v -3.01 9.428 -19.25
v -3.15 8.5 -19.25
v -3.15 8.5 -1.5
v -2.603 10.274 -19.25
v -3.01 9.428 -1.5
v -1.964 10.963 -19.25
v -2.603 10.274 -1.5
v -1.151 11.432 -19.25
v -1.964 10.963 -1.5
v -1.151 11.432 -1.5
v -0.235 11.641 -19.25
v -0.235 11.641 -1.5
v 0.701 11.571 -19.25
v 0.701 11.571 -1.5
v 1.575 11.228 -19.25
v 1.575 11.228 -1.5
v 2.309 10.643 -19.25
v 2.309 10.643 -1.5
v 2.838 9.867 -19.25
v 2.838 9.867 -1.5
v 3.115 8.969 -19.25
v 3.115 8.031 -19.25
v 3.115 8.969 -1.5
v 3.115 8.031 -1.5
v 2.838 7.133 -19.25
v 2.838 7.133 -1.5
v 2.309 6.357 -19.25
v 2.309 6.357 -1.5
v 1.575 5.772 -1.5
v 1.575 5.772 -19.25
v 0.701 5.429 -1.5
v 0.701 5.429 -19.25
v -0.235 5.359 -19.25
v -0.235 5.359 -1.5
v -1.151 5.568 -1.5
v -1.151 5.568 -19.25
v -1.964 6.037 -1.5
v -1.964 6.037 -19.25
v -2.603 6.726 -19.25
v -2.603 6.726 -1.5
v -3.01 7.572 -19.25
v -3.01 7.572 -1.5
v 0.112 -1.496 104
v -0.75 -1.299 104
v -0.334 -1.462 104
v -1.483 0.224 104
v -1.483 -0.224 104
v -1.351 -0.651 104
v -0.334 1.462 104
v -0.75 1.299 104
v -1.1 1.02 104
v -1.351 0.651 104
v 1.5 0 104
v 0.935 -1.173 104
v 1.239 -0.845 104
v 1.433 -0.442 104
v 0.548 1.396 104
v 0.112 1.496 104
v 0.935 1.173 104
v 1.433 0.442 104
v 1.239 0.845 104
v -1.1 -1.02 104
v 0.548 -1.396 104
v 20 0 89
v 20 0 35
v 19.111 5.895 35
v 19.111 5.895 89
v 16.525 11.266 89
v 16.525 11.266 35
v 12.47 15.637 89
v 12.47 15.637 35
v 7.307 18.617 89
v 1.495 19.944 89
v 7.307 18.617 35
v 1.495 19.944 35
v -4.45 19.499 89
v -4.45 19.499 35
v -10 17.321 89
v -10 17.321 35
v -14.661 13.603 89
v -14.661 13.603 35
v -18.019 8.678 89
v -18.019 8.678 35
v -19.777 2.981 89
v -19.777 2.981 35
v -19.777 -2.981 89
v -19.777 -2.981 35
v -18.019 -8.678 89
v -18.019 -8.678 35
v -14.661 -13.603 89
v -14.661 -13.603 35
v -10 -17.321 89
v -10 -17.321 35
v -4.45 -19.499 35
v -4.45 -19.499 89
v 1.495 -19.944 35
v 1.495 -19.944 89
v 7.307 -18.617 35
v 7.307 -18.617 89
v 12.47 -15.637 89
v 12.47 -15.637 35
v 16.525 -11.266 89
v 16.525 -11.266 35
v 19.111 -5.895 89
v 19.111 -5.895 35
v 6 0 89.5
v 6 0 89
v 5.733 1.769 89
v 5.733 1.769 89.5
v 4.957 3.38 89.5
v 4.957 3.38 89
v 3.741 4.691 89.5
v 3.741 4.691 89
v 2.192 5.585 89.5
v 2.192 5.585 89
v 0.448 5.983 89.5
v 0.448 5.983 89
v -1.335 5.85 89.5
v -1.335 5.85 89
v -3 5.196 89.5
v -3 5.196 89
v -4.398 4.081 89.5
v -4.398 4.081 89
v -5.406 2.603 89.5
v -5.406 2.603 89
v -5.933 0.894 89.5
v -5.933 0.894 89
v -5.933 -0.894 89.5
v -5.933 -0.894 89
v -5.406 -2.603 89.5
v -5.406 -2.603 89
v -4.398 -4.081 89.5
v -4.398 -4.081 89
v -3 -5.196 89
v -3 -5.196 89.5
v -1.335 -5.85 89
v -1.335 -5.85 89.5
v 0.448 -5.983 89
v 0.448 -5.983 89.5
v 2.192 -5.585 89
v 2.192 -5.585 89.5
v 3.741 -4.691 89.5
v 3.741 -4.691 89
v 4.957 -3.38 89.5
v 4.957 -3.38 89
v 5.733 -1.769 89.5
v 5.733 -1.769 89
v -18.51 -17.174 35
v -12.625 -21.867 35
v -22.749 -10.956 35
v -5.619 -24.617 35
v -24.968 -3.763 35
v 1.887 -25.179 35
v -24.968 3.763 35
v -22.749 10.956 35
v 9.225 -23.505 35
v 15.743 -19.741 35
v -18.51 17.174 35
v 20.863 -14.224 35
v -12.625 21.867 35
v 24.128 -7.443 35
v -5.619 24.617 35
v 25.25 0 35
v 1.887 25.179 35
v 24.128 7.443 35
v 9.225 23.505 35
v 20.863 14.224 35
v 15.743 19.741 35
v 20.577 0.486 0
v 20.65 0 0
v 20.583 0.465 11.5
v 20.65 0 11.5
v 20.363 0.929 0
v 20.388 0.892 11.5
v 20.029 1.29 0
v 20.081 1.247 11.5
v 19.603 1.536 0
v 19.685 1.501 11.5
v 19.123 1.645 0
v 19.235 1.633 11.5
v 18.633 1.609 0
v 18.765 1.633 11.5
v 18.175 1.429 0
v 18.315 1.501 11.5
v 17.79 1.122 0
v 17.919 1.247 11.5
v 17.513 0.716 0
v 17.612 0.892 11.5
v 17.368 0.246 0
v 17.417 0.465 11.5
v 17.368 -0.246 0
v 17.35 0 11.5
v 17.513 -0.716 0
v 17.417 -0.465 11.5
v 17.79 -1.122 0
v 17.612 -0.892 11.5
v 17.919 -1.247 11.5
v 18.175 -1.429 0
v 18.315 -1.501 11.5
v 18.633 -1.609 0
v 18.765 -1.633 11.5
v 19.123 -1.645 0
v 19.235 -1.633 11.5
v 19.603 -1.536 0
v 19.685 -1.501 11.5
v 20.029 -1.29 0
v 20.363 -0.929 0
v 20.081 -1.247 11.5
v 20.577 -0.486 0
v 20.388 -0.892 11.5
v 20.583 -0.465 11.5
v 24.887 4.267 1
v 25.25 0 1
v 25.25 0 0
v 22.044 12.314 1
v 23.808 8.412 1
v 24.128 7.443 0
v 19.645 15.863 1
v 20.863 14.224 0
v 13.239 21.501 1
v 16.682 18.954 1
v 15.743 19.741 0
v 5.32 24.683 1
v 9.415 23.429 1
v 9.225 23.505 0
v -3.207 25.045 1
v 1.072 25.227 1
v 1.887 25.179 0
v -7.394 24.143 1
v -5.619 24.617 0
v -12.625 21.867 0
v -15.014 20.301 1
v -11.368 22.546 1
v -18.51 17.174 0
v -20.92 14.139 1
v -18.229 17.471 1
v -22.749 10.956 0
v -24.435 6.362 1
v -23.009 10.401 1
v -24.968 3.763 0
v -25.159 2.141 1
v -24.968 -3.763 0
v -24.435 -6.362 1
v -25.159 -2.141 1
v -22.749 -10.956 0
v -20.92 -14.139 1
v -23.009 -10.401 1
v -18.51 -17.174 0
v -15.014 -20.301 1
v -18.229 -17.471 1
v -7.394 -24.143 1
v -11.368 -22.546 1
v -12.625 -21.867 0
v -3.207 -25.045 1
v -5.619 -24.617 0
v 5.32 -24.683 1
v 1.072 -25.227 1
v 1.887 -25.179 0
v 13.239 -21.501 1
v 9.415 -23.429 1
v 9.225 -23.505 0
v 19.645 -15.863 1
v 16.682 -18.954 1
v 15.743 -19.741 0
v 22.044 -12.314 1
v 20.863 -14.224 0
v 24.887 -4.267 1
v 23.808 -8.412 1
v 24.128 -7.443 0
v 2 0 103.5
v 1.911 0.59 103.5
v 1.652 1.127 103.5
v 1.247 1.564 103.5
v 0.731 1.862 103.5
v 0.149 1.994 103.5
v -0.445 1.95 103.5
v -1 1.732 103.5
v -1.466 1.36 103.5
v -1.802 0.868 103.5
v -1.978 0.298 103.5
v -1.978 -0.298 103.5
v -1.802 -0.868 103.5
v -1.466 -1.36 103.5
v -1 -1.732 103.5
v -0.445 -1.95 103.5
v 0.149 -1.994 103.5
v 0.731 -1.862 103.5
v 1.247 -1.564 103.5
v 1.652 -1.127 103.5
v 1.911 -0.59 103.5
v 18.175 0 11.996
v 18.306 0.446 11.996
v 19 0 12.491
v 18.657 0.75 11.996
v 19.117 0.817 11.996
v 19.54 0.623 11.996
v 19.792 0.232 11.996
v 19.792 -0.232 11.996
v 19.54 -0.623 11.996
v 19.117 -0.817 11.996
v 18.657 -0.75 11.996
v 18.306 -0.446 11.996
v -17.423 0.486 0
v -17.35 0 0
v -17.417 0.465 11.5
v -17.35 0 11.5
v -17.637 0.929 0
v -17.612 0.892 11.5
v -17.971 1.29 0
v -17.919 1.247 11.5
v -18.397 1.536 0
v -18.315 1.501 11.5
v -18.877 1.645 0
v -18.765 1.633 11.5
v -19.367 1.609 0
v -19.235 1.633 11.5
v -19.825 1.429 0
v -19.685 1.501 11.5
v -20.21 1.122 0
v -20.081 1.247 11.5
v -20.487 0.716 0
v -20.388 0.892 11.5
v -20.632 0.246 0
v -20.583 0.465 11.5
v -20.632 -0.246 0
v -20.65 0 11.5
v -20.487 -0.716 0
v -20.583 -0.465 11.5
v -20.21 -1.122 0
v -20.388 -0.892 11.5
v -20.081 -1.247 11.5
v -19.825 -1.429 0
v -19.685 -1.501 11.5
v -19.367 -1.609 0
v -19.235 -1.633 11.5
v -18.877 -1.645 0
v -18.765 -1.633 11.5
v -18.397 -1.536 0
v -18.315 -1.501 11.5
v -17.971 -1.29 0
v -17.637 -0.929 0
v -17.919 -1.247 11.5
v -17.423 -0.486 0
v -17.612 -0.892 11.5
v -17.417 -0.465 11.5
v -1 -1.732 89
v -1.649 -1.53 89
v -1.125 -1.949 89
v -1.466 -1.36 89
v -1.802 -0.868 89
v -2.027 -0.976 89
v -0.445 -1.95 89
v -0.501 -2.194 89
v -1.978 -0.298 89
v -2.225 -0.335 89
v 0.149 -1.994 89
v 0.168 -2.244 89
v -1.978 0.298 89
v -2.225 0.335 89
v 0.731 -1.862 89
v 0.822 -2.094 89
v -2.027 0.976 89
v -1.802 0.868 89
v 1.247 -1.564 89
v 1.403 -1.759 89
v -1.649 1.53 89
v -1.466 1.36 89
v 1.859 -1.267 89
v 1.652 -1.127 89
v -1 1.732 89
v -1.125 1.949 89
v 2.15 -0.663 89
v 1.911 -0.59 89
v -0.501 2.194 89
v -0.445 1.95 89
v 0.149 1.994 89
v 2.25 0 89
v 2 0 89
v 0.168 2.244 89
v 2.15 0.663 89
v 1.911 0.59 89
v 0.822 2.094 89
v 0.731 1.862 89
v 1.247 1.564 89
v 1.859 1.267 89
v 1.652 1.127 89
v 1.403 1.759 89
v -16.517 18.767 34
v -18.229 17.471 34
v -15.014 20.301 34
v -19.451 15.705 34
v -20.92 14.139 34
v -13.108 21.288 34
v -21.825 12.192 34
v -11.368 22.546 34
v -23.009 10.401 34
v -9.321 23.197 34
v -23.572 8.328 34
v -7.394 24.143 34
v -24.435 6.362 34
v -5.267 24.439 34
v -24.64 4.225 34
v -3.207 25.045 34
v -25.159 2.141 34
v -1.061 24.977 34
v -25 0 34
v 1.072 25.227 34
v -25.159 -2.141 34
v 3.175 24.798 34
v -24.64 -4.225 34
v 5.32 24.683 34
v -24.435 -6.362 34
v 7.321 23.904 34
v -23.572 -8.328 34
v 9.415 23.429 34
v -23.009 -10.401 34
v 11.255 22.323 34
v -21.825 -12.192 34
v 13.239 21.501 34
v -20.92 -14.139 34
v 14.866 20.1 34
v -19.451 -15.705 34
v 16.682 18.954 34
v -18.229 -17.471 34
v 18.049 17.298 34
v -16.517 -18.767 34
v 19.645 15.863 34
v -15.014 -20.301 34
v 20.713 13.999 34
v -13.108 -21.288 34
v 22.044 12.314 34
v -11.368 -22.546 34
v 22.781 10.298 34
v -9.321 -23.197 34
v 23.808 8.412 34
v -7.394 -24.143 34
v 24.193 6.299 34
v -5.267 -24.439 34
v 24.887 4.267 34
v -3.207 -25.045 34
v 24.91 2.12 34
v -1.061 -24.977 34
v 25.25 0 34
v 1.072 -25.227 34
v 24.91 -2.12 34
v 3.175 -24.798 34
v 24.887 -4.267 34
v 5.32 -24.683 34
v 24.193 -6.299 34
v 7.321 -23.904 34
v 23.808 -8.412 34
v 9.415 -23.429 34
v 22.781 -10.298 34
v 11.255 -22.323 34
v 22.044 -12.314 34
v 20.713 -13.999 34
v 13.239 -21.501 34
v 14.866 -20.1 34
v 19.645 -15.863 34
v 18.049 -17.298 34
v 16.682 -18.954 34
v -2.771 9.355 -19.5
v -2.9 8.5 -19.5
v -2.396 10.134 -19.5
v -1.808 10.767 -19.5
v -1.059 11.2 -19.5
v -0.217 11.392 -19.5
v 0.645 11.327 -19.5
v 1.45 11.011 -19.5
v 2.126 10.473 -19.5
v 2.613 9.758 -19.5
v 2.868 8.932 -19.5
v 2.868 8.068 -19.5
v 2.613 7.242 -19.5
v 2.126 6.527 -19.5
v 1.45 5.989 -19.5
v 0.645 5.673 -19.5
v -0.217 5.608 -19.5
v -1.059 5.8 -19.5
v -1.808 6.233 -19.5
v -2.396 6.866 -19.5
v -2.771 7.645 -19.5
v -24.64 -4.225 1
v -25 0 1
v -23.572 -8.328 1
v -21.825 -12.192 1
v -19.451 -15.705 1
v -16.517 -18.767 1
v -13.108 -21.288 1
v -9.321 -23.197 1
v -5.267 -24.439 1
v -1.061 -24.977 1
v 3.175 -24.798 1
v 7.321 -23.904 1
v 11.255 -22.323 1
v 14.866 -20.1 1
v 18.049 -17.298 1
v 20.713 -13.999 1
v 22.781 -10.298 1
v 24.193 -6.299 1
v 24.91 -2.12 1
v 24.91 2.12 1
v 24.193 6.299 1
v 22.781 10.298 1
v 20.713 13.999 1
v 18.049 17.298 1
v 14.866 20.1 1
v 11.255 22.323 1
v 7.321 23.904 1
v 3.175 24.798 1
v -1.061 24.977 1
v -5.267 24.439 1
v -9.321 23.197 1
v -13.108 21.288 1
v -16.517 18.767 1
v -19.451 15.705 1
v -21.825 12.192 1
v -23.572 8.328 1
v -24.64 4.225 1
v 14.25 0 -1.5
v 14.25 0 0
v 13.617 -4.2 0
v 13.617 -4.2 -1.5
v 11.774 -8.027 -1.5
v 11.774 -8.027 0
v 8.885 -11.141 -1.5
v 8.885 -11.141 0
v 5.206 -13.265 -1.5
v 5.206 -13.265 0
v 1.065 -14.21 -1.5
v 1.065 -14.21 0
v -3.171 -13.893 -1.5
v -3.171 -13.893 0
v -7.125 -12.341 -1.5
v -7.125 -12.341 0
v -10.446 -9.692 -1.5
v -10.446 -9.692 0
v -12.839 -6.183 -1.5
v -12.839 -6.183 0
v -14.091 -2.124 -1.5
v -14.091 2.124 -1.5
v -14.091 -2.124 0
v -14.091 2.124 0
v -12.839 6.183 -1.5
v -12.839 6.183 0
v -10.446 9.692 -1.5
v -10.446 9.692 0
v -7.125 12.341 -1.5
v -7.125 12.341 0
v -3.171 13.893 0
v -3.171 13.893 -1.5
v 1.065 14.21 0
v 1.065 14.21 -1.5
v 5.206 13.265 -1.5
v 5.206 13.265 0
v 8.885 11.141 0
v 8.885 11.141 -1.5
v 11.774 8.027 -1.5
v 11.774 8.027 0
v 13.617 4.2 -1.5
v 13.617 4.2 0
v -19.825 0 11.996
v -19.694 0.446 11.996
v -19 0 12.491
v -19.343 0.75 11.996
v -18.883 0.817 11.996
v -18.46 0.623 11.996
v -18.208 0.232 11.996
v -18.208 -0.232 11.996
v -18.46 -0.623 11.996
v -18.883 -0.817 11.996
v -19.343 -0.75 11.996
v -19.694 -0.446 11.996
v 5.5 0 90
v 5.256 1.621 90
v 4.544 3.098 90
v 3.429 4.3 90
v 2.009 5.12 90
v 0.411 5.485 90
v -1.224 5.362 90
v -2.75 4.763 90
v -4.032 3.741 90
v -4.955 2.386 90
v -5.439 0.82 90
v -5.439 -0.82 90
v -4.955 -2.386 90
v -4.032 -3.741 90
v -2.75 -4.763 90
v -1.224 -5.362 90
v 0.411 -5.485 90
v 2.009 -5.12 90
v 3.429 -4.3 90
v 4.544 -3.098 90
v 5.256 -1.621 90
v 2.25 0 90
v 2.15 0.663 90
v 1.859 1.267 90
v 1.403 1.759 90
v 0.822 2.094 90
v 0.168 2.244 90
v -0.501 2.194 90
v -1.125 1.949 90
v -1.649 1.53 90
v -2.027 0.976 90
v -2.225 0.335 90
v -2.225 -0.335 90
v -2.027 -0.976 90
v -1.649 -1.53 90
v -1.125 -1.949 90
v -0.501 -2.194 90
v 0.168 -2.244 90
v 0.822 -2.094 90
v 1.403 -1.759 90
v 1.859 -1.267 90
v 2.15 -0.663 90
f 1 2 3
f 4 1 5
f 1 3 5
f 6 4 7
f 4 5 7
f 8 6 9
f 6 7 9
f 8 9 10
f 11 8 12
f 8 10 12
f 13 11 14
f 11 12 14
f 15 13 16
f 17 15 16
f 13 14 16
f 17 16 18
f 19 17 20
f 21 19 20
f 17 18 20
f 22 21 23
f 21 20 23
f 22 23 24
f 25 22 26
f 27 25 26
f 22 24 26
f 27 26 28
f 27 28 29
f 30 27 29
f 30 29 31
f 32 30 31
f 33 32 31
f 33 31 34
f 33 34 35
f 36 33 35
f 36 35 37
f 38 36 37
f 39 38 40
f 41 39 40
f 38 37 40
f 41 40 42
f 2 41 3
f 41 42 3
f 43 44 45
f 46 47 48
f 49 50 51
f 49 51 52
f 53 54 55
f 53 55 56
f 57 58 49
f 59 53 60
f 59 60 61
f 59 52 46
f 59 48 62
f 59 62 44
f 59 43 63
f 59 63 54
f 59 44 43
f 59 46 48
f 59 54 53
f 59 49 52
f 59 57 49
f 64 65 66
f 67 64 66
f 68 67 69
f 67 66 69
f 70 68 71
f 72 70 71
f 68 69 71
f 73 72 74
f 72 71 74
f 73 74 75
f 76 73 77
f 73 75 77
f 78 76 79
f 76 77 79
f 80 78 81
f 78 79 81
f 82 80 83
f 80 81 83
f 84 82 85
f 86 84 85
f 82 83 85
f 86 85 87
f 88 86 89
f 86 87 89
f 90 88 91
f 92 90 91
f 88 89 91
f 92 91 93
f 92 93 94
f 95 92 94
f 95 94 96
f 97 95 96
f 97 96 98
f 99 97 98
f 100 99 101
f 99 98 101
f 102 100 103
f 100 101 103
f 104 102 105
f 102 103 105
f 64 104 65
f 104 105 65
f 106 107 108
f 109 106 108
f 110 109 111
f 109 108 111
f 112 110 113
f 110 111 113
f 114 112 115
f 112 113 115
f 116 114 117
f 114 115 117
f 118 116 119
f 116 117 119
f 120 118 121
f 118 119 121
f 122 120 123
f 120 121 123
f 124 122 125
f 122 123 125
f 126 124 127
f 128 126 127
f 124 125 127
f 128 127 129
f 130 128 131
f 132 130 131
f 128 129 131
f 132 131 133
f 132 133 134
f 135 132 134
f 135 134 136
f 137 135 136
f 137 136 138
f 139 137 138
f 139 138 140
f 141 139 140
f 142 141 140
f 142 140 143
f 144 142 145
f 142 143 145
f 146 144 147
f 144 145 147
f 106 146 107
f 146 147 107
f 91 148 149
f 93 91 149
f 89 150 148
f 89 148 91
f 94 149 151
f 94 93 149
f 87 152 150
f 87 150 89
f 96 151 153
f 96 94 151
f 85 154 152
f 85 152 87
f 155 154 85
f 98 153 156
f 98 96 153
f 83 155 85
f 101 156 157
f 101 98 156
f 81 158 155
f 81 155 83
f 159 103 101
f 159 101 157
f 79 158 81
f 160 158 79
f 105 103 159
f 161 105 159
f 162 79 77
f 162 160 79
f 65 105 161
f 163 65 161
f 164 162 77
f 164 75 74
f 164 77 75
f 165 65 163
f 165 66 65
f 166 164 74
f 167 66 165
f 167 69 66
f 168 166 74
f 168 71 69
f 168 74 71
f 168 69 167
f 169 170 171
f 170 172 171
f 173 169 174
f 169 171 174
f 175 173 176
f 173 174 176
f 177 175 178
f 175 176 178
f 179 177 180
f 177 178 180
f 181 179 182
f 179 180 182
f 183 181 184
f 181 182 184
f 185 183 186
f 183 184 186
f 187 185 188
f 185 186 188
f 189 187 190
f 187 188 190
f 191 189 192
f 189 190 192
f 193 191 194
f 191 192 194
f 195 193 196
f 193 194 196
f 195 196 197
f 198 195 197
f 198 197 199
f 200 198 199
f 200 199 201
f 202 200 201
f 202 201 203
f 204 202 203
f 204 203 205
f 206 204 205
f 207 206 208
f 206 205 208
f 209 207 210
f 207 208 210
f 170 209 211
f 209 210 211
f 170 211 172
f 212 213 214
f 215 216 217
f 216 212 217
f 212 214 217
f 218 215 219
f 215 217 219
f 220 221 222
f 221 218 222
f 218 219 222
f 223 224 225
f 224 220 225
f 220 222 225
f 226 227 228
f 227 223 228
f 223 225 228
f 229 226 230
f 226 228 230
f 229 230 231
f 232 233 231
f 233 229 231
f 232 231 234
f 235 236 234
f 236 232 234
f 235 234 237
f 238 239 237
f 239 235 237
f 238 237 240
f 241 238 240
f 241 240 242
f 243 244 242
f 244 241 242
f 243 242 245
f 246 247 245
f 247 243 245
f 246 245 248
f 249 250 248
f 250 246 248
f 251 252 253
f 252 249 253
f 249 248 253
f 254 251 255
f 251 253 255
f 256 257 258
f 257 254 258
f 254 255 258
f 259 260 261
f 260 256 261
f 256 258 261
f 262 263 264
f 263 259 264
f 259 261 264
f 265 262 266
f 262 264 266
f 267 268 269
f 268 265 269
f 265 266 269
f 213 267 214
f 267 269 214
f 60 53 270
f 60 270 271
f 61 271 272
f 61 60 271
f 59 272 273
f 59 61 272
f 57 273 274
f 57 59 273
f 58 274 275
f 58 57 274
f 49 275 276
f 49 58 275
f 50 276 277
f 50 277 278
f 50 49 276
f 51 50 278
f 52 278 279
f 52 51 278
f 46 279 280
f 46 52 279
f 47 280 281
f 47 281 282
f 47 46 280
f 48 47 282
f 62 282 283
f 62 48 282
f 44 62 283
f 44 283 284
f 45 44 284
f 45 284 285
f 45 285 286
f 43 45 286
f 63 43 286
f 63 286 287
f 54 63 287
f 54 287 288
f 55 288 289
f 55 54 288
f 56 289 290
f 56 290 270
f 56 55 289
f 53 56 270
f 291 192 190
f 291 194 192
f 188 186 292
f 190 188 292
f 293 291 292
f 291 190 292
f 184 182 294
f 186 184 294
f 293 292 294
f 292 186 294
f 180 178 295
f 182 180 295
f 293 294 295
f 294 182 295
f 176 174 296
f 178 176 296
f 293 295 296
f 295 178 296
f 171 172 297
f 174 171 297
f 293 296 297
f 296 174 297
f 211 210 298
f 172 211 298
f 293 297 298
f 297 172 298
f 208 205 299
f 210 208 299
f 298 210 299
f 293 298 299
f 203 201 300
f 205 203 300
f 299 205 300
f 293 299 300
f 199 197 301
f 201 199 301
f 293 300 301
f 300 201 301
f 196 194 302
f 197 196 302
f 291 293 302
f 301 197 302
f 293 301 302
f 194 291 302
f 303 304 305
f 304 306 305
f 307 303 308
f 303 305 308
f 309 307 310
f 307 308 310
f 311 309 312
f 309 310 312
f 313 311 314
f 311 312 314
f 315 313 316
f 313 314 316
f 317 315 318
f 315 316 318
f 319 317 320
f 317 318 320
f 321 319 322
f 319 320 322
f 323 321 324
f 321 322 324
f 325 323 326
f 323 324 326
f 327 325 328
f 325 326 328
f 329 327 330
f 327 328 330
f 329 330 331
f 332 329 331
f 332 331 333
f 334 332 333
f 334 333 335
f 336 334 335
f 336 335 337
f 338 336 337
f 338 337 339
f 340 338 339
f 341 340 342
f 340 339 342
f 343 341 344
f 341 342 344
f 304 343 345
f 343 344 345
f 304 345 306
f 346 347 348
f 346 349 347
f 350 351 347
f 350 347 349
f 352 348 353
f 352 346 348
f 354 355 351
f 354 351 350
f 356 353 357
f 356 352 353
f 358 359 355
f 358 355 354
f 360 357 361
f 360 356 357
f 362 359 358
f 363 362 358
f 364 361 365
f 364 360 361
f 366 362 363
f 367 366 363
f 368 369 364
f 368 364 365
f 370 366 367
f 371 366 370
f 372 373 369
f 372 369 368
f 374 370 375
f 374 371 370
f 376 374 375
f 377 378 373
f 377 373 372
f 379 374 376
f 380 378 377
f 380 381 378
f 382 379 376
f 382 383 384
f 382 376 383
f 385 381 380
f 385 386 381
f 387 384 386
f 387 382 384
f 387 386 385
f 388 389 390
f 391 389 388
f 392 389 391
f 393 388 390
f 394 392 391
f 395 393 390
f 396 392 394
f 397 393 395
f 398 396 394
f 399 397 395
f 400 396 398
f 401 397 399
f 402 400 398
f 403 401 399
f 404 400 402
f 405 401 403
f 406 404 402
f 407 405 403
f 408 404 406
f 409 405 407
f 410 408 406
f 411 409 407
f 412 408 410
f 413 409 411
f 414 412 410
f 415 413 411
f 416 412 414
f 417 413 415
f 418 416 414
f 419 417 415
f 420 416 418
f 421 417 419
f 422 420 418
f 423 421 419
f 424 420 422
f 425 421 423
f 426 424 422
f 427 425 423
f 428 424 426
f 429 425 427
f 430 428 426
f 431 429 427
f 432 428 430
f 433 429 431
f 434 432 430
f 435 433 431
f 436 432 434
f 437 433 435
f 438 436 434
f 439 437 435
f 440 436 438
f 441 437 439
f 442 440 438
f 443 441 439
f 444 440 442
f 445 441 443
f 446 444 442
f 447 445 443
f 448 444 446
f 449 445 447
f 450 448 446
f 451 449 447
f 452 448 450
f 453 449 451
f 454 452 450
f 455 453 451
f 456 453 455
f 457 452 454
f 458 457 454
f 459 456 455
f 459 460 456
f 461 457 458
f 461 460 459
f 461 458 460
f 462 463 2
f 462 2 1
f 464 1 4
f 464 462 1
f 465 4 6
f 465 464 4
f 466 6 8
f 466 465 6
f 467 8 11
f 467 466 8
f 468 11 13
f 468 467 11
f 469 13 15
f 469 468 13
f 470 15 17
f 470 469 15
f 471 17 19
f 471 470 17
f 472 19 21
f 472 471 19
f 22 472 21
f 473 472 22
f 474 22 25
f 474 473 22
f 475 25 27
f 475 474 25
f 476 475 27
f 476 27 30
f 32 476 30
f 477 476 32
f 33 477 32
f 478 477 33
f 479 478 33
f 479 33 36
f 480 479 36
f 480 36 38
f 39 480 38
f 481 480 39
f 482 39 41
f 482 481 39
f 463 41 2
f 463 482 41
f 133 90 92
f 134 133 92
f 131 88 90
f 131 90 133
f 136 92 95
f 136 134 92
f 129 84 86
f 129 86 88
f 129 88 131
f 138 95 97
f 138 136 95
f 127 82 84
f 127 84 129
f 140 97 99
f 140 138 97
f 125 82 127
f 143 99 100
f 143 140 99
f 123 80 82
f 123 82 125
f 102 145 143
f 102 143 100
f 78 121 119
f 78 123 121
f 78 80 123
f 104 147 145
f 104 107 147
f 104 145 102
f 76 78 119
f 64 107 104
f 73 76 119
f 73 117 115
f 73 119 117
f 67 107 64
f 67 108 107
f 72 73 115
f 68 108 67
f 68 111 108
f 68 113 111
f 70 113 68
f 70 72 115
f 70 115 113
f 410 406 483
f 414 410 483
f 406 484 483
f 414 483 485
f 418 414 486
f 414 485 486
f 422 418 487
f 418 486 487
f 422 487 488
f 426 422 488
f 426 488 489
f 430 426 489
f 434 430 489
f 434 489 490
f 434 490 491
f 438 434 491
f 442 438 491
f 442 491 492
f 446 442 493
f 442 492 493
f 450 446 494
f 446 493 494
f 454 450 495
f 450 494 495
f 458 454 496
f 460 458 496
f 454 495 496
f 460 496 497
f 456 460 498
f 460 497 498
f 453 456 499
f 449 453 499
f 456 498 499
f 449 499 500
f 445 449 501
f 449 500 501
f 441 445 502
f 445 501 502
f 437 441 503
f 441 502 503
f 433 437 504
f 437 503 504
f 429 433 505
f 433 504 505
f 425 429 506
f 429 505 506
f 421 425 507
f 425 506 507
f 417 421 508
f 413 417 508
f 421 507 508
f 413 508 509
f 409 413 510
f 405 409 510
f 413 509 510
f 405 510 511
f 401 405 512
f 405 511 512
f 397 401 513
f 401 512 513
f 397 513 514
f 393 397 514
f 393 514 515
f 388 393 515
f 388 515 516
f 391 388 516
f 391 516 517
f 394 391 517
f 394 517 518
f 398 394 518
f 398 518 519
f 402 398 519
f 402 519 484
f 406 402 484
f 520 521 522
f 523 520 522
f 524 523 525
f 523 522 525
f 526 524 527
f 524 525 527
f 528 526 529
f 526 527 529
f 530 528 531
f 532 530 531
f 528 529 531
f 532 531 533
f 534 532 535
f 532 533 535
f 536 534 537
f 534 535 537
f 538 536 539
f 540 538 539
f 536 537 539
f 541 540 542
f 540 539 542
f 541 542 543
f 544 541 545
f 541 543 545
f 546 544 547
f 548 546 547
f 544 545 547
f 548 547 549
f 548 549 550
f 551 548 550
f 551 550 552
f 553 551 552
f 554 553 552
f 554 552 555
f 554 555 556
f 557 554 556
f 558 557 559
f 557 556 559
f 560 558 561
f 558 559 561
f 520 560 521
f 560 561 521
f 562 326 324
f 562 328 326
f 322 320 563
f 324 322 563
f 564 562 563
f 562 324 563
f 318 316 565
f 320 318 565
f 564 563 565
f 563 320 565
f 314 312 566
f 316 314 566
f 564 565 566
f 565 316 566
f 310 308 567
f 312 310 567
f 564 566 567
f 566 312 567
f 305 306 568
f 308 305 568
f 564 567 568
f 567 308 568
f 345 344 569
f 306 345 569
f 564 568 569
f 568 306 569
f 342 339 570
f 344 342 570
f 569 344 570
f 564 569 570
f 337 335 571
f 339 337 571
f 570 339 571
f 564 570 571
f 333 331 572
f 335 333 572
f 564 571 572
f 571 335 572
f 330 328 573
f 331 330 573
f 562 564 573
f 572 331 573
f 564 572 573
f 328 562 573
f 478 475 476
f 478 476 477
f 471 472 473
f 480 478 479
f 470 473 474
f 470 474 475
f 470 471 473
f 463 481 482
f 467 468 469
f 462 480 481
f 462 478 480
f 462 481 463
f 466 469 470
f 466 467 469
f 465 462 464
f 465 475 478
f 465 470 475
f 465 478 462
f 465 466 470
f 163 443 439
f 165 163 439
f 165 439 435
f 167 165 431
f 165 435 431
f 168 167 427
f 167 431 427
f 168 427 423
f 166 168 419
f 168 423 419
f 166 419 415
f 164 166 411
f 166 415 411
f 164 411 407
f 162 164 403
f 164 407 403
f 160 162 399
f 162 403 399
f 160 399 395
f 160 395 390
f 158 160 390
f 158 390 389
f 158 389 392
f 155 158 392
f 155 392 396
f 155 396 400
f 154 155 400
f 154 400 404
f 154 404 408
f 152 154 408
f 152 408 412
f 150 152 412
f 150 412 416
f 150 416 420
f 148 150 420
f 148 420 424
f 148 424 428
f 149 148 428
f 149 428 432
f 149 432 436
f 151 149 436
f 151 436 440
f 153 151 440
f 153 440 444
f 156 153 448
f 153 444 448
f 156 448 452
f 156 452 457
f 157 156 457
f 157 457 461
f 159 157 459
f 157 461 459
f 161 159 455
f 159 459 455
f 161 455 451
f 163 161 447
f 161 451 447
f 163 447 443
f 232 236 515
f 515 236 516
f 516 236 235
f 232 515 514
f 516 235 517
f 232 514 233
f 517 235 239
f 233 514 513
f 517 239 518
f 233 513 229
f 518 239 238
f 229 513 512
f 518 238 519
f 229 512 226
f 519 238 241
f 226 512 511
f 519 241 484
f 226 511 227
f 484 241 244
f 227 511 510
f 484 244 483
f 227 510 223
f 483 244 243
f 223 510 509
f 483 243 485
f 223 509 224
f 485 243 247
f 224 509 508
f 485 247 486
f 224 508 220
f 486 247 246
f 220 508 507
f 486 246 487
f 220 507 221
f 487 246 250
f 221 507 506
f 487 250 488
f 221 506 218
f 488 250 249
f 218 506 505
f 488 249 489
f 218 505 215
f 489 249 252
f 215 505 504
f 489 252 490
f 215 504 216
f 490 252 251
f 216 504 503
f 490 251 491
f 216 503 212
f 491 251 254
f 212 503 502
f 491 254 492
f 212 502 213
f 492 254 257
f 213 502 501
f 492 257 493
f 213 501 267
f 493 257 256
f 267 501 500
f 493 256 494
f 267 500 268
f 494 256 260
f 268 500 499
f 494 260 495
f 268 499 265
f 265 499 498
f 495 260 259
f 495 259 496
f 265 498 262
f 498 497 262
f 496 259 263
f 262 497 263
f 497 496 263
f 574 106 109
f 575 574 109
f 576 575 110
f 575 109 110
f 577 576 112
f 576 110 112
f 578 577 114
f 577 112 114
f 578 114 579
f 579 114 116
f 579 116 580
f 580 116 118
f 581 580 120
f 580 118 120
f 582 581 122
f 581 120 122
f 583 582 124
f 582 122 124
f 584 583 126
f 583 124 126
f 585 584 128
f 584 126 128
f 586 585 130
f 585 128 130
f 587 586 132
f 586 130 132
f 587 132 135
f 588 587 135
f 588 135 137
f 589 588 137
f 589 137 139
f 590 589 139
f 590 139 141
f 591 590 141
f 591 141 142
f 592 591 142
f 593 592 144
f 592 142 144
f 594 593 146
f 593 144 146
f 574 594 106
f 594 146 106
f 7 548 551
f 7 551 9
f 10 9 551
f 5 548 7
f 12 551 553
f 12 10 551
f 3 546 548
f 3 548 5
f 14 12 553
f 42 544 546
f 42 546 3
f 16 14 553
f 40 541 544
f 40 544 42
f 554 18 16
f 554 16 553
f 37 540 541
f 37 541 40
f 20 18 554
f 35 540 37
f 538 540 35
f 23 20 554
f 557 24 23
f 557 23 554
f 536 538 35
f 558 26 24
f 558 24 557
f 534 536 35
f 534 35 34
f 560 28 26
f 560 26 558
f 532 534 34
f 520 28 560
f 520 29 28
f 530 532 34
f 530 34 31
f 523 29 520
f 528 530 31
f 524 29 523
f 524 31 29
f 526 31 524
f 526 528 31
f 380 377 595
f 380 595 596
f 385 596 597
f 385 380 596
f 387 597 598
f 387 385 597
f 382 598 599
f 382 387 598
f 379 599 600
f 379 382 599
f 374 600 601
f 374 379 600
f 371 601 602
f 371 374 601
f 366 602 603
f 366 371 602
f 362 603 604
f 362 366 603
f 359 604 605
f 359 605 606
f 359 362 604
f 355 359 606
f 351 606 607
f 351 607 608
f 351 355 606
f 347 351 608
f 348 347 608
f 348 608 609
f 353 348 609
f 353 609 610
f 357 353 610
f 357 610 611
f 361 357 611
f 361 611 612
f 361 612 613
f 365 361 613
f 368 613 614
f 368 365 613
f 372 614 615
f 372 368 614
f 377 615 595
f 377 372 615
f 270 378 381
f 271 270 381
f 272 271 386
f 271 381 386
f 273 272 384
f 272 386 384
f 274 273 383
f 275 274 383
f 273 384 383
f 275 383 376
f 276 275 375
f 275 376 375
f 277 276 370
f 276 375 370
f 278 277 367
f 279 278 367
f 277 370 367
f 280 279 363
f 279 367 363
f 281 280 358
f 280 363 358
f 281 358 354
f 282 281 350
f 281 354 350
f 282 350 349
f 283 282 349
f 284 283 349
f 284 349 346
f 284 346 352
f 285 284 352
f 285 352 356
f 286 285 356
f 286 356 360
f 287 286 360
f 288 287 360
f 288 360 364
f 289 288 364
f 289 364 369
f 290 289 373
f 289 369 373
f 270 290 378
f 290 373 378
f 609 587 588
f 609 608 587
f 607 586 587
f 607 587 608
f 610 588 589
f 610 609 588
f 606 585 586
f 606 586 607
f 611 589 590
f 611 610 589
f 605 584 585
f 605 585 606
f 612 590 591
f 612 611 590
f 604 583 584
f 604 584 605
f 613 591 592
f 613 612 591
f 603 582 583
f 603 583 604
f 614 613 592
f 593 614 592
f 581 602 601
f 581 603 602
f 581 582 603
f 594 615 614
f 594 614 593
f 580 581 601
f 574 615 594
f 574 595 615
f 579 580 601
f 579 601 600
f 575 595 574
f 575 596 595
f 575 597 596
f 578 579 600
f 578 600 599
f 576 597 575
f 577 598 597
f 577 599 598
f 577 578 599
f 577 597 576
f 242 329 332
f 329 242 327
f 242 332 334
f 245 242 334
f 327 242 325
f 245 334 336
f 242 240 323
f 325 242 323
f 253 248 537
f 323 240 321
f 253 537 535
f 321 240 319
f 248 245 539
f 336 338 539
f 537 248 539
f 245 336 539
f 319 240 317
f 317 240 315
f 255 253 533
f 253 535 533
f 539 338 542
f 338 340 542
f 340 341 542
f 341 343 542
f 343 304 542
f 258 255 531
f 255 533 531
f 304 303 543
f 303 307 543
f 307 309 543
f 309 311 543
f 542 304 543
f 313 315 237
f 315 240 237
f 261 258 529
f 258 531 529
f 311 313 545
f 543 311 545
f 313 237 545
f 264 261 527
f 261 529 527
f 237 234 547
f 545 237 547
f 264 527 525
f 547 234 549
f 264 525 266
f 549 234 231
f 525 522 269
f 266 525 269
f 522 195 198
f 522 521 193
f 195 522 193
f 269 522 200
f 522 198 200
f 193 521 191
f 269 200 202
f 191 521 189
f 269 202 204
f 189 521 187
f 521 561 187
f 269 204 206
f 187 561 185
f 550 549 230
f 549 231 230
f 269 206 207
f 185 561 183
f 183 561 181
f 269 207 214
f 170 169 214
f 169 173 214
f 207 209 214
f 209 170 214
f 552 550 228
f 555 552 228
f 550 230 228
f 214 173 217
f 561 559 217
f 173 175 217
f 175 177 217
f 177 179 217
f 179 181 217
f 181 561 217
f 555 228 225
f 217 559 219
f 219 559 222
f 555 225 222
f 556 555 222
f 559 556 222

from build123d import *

# Parameters (mm, degrees)
ESBO_O1_R                 = 25.25
RESSALTO_EXTRUS_O1_DEPTH  = 35
ESBO_O2_R                 = 20
RESSALTO_EXTRUS_O2_DEPTH  = 54
ESBO_O3_R                 = 14.25
RESSALTO_EXTRUS_O3_DEPTH  = 1.5
FURO_ROSCADO_DE_M41_D     = 3.3
FURO_ROSCADO_DE_M41_DEPTH = 11.5
FURO_ROSCADO_DE_M41_TIP   = 0.991420021
ESBO_O7_R                 = 3.15
RESSALTO_EXTRUS_O4_DEPTH  = 18
CHANFRO1_SIZE             = 0.25
ESBO_O8_R                 = 2
RESSALTO_EXTRUS_O5_DEPTH  = 15
CHANFRO2_SIZE             = 0.5
ESBO_O9_R                 = 6
ESBO_O9_R_2               = 2.25
RESSALTO_EXTRUS_O6_DEPTH  = 1
CHANFRO3_SIZE             = 0.5
ESBO_O10_W                = 33
ESBO_O10_H                = 15.540446693


with BuildPart() as part:
    # Esboço1 → Ressalto-extrusão1 (new body)
    with BuildSketch(Plane.XY):
        Circle(ESBO_O1_R)
    extrude(amount=RESSALTO_EXTRUS_O1_DEPTH)

    # Esboço2 → Ressalto-extrusão2 (add)
    with BuildSketch(Plane.XY.offset(35)):
        Circle(ESBO_O2_R)
    extrude(amount=RESSALTO_EXTRUS_O2_DEPTH)

    # Esboço3 → Ressalto-extrusão3 (add)
    with BuildSketch(Plane(origin=(0, 0, 0), x_dir=(-1, 0, 0), z_dir=(0, 0, -1))):
        with Locations(Location((0, 0, 0), (0, 0, 180))):
            Circle(ESBO_O3_R)
    extrude(amount=RESSALTO_EXTRUS_O3_DEPTH)

    # Furo roscado de M41
    with Locations(Plane(origin=(0, 0, 0), x_dir=(-1, 0, 0), z_dir=(0, 0, -1))):
        with Locations((-19, 0), (19, 0)):
            Hole(FURO_ROSCADO_DE_M41_D / 2, depth=FURO_ROSCADO_DE_M41_DEPTH)
            with Locations((0, 0, -(FURO_ROSCADO_DE_M41_DEPTH + FURO_ROSCADO_DE_M41_TIP / 2))):  # 118° drill point
                Cone(0, FURO_ROSCADO_DE_M41_D / 2, FURO_ROSCADO_DE_M41_TIP, mode=Mode.SUBTRACT)

    # Esboço7 → Ressalto-extrusão4 (add)
    with BuildSketch(Plane(origin=(0, 0, -1.5), x_dir=(-1, 0, 0), z_dir=(0, 0, -1))):
        with Locations((0, 8.5)):
            Circle(ESBO_O7_R)
    extrude(amount=RESSALTO_EXTRUS_O4_DEPTH)

    # Chanfro1
    chanfro1_edges = [part.edges().sort_by_distance(p)[0] for p in [
        (3.15, 8.5, -19.5),
    ]]
    chamfer(chanfro1_edges, length=CHANFRO1_SIZE)

    # Esboço8 → Ressalto-extrusão5 (add)
    with BuildSketch(Plane.XY.offset(89)):
        Circle(ESBO_O8_R)
    extrude(amount=RESSALTO_EXTRUS_O5_DEPTH)

    # Chanfro2
    chanfro2_edges = [part.edges().sort_by_distance(p)[0] for p in [
        (-2, 0, 104),
    ]]
    chamfer(chanfro2_edges, length=CHANFRO2_SIZE)

    # Esboço9 → Ressalto-extrusão6 (add)
    with BuildSketch(Plane.XY.offset(89)):
        Circle(ESBO_O9_R)
        Circle(ESBO_O9_R_2, mode=Mode.SUBTRACT)
    extrude(amount=RESSALTO_EXTRUS_O6_DEPTH)

    # Chanfro3
    chanfro3_edges = [part.edges().sort_by_distance(p)[0] for p in [
        (-6, 0, 90),
    ]]
    chamfer(chanfro3_edges, length=CHANFRO3_SIZE)

    # Esboço10 → Corte-Revolução1 (revolve, cut)
    with BuildSketch(Plane(origin=(0, 0, 0), x_dir=(0, 0, -1), z_dir=(1, 0, 0)), mode=Mode.PRIVATE) as corte_revolu_o1_sk:
        with Locations((-17.5, 32.770223347)):
            Rectangle(ESBO_O10_W, ESBO_O10_H)
    revolve(corte_revolu_o1_sk.sketch.rotate(Axis((0, 0, 0), (0, 0, 1)), 90), axis=Axis((0, 0, 0), (0, 0, 1)), mode=Mode.SUBTRACT)


solid = part.part
